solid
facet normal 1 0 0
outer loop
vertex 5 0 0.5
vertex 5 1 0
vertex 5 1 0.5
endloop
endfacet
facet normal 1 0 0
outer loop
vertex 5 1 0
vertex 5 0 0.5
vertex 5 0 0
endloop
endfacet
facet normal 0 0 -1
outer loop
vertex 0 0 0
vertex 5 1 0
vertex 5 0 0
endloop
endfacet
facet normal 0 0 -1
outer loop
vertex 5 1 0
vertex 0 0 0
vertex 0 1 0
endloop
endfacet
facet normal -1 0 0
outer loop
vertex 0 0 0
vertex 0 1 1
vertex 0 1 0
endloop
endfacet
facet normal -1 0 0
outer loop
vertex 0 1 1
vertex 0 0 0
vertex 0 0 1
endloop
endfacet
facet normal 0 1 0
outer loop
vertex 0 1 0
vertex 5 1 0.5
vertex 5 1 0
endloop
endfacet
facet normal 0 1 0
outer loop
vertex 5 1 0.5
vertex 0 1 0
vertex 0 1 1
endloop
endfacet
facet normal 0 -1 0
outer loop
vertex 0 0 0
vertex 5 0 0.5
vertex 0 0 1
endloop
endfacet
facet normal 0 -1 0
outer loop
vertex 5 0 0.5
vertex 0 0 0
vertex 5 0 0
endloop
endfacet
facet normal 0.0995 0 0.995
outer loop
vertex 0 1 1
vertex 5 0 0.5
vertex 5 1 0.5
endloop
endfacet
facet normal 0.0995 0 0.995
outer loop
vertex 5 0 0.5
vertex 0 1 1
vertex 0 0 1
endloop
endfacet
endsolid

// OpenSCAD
//#######################################################################
// single_taper_spar.scad - spat tapered on one side
// (c) 2021 - Roie R. Black
// docs: https://rblack.github.io/math-magik/magik/single_taper_spar.html

module single_taper_spar(l=5, z1=1, z2=0.5, t=1, debug=false) {
  // calculate taper angle
  ang = atan2(z1-z2,l);

  difference() {
    // basic spar
    cube([l,t,z1]);

    // trimming block
    translate([0,-t/2, z1])
    rotate([0,ang,0])
    if (debug) {
      #cube([l+1, 2*t, z1]);
    } else {
      cube([l+1, 2*t, z1]);
    }
  }
}

single_taper_spar(debug=true);
